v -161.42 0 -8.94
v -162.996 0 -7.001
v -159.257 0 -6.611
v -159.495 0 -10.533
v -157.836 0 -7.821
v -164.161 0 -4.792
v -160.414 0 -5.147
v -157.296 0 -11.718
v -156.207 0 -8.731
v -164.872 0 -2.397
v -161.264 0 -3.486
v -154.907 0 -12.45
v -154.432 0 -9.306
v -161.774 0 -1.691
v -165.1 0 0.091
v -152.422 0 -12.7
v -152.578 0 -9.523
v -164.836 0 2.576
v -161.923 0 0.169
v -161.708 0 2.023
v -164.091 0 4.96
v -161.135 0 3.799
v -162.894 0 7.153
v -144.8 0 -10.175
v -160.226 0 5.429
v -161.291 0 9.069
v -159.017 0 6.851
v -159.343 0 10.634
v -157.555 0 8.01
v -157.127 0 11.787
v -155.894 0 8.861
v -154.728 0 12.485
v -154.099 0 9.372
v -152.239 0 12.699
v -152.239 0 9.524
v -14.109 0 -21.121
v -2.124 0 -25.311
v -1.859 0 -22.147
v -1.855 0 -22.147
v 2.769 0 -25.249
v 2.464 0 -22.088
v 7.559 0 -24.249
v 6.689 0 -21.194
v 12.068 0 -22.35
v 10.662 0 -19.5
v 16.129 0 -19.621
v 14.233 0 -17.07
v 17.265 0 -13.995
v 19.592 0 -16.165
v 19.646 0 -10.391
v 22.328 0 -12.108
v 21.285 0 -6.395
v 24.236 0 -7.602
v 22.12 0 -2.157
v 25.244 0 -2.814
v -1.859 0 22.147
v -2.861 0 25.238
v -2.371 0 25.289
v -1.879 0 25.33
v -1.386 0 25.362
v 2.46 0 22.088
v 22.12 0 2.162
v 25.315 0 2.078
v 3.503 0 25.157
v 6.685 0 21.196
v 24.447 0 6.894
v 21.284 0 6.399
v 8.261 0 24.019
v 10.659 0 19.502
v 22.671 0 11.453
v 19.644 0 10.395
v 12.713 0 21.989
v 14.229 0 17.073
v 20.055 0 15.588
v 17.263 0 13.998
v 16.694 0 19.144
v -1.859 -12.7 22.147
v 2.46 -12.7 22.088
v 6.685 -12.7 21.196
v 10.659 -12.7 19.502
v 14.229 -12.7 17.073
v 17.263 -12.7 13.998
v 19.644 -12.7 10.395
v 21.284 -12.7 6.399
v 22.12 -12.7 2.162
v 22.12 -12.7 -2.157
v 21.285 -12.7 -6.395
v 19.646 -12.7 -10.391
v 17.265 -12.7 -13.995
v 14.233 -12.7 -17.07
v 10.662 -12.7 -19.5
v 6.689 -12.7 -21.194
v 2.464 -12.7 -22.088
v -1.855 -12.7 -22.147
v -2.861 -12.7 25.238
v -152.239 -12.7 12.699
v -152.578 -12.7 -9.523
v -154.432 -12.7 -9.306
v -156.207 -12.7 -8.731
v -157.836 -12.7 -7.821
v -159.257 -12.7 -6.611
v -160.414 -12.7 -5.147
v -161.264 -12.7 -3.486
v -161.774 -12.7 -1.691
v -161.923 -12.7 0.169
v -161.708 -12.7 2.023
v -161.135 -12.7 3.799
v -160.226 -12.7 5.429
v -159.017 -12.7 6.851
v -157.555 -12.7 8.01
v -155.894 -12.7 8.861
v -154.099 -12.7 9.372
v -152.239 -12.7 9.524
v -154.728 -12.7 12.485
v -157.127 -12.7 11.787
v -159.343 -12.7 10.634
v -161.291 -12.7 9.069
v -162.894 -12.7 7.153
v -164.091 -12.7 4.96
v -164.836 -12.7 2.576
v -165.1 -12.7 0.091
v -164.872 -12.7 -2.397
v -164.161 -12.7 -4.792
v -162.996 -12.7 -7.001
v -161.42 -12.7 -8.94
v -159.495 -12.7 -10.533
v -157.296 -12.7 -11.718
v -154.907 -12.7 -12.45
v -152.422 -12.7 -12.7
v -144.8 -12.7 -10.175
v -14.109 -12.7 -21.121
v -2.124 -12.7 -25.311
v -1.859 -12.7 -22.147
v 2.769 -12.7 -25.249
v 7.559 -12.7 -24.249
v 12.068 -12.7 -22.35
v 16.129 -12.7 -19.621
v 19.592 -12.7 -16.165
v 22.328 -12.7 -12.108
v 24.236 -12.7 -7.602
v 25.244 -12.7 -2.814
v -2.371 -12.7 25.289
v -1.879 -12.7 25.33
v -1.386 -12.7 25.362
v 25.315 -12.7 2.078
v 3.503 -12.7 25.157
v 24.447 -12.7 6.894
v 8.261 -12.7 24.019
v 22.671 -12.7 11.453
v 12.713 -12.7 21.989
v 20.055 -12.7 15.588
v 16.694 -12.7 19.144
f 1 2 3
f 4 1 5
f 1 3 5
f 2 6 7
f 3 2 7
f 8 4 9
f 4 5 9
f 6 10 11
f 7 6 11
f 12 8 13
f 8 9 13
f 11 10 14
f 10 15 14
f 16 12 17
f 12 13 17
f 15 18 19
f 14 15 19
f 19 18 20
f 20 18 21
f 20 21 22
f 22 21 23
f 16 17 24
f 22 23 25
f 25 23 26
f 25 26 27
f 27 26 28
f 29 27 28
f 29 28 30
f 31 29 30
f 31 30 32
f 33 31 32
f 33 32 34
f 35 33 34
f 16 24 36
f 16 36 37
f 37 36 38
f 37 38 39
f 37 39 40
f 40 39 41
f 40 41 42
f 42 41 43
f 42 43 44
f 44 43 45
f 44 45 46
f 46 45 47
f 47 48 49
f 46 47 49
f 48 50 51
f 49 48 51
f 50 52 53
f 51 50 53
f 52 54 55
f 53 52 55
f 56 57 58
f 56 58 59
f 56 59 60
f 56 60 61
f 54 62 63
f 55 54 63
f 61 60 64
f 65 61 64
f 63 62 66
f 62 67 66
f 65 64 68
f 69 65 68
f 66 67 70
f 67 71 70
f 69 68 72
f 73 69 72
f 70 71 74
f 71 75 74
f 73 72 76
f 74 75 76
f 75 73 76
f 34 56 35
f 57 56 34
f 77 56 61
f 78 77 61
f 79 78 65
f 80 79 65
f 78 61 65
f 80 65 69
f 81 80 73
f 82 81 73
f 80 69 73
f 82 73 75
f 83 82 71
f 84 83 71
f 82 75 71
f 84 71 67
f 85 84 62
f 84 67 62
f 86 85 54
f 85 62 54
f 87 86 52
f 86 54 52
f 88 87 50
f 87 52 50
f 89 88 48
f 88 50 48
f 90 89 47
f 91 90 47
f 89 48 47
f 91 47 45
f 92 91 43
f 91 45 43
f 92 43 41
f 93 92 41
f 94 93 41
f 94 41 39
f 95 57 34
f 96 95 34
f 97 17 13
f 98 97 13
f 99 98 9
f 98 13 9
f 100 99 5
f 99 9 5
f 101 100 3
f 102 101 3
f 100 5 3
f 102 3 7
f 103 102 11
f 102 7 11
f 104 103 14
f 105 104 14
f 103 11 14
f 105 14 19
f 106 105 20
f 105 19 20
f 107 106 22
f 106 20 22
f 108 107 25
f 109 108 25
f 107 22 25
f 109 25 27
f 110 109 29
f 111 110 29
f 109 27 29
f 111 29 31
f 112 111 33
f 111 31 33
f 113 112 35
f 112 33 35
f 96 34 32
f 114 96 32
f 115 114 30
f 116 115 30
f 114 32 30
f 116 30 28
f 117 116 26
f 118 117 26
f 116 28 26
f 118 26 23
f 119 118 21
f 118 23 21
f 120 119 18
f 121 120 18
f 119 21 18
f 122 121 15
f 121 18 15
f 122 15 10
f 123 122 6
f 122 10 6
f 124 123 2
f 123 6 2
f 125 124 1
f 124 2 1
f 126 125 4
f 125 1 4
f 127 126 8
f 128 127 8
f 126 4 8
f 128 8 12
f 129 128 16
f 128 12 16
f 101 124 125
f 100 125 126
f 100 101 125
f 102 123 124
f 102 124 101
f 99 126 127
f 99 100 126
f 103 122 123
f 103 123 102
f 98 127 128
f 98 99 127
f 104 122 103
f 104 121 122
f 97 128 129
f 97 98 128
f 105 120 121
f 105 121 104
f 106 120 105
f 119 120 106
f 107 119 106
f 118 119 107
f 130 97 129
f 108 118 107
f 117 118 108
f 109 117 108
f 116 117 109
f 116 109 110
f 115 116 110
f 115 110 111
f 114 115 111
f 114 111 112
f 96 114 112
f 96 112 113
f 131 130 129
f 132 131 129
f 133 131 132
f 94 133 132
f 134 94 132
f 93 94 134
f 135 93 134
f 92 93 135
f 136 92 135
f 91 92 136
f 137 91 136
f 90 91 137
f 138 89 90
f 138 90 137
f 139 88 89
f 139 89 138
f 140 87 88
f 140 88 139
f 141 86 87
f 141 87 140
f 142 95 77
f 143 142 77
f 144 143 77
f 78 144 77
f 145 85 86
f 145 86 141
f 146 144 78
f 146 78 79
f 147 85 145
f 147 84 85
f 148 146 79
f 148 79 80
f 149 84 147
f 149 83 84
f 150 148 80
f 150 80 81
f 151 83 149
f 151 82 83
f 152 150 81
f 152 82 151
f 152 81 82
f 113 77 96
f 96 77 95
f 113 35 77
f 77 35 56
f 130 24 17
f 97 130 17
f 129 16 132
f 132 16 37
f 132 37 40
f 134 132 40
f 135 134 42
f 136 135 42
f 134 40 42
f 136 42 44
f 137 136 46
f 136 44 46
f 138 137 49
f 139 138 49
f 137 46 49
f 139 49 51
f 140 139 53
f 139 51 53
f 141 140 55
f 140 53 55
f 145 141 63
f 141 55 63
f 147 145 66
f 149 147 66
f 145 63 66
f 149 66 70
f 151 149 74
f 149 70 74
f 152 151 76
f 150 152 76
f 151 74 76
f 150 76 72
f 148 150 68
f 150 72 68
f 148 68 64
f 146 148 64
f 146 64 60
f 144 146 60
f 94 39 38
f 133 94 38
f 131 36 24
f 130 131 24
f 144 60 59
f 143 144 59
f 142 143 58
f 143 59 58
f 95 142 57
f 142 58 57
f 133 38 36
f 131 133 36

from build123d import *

# Parameters (mm, degrees)
F1_DEPTH = 12.7


with BuildPart() as f1:
    # F0 (on Front) → F1 (new body)
    with BuildSketch(Plane.XZ):
        with BuildLine():
            Line((-2.8614659345, 25.2383044737), (-152.2392334973, 12.6989824054))
            ThreePointArc((-152.2392334973, 12.6989824054), (-165.0996721713, 0.0912509774), (-152.421732718, -12.6999814051))
            Line((-152.421732718, -12.6999814051), (-2.1237788852, -25.3110561464))
            ThreePointArc((-2.1237788852, -25.3110561464), (25.3973091766, -0.3697114954), (-1.3861233029, 25.3621501886))
            Line((-1.3861233029, 25.3621501886), (-2.8614659345, 25.2383044737))
        make_face()
        with BuildLine():
            ThreePointArc((-1.8591100152, 22.1471066948), (22.2249999045, 0.0020599789), (-1.8550044649, -22.1474509467))
            Line((-1.8550044649, -22.1474509467), (-1.8591100471, -22.1471070753))
            Line((-1.8591100471, -22.1471070753), (-14.1088199902, -21.1211078896))
            Line((-14.1088199902, -21.1211078896), (-144.7998013534, -10.1748209091))
            Line((-144.7998013534, -10.1748209091), (-152.5780849398, -9.5233350647))
            ThreePointArc((-152.5780849398, -9.5233350647), (-161.9234930515, 0.1694257913), (-152.2392334973, 9.5236431649))
            Line((-152.2392334973, 9.5236431649), (-1.8591100152, 22.1471066948))
        make_face(mode=Mode.SUBTRACT)
        with BuildLine():
            ThreePointArc((-1.3861233029, 25.3621501886), (-2.1246971603, 25.3109790798), (-2.8614659345, 25.2383044737))
            Line((-2.8614659345, 25.2383044737), (-1.3861233029, 25.3621501886))
        make_face()
    extrude(amount=F1_DEPTH)


solid = f1.part
